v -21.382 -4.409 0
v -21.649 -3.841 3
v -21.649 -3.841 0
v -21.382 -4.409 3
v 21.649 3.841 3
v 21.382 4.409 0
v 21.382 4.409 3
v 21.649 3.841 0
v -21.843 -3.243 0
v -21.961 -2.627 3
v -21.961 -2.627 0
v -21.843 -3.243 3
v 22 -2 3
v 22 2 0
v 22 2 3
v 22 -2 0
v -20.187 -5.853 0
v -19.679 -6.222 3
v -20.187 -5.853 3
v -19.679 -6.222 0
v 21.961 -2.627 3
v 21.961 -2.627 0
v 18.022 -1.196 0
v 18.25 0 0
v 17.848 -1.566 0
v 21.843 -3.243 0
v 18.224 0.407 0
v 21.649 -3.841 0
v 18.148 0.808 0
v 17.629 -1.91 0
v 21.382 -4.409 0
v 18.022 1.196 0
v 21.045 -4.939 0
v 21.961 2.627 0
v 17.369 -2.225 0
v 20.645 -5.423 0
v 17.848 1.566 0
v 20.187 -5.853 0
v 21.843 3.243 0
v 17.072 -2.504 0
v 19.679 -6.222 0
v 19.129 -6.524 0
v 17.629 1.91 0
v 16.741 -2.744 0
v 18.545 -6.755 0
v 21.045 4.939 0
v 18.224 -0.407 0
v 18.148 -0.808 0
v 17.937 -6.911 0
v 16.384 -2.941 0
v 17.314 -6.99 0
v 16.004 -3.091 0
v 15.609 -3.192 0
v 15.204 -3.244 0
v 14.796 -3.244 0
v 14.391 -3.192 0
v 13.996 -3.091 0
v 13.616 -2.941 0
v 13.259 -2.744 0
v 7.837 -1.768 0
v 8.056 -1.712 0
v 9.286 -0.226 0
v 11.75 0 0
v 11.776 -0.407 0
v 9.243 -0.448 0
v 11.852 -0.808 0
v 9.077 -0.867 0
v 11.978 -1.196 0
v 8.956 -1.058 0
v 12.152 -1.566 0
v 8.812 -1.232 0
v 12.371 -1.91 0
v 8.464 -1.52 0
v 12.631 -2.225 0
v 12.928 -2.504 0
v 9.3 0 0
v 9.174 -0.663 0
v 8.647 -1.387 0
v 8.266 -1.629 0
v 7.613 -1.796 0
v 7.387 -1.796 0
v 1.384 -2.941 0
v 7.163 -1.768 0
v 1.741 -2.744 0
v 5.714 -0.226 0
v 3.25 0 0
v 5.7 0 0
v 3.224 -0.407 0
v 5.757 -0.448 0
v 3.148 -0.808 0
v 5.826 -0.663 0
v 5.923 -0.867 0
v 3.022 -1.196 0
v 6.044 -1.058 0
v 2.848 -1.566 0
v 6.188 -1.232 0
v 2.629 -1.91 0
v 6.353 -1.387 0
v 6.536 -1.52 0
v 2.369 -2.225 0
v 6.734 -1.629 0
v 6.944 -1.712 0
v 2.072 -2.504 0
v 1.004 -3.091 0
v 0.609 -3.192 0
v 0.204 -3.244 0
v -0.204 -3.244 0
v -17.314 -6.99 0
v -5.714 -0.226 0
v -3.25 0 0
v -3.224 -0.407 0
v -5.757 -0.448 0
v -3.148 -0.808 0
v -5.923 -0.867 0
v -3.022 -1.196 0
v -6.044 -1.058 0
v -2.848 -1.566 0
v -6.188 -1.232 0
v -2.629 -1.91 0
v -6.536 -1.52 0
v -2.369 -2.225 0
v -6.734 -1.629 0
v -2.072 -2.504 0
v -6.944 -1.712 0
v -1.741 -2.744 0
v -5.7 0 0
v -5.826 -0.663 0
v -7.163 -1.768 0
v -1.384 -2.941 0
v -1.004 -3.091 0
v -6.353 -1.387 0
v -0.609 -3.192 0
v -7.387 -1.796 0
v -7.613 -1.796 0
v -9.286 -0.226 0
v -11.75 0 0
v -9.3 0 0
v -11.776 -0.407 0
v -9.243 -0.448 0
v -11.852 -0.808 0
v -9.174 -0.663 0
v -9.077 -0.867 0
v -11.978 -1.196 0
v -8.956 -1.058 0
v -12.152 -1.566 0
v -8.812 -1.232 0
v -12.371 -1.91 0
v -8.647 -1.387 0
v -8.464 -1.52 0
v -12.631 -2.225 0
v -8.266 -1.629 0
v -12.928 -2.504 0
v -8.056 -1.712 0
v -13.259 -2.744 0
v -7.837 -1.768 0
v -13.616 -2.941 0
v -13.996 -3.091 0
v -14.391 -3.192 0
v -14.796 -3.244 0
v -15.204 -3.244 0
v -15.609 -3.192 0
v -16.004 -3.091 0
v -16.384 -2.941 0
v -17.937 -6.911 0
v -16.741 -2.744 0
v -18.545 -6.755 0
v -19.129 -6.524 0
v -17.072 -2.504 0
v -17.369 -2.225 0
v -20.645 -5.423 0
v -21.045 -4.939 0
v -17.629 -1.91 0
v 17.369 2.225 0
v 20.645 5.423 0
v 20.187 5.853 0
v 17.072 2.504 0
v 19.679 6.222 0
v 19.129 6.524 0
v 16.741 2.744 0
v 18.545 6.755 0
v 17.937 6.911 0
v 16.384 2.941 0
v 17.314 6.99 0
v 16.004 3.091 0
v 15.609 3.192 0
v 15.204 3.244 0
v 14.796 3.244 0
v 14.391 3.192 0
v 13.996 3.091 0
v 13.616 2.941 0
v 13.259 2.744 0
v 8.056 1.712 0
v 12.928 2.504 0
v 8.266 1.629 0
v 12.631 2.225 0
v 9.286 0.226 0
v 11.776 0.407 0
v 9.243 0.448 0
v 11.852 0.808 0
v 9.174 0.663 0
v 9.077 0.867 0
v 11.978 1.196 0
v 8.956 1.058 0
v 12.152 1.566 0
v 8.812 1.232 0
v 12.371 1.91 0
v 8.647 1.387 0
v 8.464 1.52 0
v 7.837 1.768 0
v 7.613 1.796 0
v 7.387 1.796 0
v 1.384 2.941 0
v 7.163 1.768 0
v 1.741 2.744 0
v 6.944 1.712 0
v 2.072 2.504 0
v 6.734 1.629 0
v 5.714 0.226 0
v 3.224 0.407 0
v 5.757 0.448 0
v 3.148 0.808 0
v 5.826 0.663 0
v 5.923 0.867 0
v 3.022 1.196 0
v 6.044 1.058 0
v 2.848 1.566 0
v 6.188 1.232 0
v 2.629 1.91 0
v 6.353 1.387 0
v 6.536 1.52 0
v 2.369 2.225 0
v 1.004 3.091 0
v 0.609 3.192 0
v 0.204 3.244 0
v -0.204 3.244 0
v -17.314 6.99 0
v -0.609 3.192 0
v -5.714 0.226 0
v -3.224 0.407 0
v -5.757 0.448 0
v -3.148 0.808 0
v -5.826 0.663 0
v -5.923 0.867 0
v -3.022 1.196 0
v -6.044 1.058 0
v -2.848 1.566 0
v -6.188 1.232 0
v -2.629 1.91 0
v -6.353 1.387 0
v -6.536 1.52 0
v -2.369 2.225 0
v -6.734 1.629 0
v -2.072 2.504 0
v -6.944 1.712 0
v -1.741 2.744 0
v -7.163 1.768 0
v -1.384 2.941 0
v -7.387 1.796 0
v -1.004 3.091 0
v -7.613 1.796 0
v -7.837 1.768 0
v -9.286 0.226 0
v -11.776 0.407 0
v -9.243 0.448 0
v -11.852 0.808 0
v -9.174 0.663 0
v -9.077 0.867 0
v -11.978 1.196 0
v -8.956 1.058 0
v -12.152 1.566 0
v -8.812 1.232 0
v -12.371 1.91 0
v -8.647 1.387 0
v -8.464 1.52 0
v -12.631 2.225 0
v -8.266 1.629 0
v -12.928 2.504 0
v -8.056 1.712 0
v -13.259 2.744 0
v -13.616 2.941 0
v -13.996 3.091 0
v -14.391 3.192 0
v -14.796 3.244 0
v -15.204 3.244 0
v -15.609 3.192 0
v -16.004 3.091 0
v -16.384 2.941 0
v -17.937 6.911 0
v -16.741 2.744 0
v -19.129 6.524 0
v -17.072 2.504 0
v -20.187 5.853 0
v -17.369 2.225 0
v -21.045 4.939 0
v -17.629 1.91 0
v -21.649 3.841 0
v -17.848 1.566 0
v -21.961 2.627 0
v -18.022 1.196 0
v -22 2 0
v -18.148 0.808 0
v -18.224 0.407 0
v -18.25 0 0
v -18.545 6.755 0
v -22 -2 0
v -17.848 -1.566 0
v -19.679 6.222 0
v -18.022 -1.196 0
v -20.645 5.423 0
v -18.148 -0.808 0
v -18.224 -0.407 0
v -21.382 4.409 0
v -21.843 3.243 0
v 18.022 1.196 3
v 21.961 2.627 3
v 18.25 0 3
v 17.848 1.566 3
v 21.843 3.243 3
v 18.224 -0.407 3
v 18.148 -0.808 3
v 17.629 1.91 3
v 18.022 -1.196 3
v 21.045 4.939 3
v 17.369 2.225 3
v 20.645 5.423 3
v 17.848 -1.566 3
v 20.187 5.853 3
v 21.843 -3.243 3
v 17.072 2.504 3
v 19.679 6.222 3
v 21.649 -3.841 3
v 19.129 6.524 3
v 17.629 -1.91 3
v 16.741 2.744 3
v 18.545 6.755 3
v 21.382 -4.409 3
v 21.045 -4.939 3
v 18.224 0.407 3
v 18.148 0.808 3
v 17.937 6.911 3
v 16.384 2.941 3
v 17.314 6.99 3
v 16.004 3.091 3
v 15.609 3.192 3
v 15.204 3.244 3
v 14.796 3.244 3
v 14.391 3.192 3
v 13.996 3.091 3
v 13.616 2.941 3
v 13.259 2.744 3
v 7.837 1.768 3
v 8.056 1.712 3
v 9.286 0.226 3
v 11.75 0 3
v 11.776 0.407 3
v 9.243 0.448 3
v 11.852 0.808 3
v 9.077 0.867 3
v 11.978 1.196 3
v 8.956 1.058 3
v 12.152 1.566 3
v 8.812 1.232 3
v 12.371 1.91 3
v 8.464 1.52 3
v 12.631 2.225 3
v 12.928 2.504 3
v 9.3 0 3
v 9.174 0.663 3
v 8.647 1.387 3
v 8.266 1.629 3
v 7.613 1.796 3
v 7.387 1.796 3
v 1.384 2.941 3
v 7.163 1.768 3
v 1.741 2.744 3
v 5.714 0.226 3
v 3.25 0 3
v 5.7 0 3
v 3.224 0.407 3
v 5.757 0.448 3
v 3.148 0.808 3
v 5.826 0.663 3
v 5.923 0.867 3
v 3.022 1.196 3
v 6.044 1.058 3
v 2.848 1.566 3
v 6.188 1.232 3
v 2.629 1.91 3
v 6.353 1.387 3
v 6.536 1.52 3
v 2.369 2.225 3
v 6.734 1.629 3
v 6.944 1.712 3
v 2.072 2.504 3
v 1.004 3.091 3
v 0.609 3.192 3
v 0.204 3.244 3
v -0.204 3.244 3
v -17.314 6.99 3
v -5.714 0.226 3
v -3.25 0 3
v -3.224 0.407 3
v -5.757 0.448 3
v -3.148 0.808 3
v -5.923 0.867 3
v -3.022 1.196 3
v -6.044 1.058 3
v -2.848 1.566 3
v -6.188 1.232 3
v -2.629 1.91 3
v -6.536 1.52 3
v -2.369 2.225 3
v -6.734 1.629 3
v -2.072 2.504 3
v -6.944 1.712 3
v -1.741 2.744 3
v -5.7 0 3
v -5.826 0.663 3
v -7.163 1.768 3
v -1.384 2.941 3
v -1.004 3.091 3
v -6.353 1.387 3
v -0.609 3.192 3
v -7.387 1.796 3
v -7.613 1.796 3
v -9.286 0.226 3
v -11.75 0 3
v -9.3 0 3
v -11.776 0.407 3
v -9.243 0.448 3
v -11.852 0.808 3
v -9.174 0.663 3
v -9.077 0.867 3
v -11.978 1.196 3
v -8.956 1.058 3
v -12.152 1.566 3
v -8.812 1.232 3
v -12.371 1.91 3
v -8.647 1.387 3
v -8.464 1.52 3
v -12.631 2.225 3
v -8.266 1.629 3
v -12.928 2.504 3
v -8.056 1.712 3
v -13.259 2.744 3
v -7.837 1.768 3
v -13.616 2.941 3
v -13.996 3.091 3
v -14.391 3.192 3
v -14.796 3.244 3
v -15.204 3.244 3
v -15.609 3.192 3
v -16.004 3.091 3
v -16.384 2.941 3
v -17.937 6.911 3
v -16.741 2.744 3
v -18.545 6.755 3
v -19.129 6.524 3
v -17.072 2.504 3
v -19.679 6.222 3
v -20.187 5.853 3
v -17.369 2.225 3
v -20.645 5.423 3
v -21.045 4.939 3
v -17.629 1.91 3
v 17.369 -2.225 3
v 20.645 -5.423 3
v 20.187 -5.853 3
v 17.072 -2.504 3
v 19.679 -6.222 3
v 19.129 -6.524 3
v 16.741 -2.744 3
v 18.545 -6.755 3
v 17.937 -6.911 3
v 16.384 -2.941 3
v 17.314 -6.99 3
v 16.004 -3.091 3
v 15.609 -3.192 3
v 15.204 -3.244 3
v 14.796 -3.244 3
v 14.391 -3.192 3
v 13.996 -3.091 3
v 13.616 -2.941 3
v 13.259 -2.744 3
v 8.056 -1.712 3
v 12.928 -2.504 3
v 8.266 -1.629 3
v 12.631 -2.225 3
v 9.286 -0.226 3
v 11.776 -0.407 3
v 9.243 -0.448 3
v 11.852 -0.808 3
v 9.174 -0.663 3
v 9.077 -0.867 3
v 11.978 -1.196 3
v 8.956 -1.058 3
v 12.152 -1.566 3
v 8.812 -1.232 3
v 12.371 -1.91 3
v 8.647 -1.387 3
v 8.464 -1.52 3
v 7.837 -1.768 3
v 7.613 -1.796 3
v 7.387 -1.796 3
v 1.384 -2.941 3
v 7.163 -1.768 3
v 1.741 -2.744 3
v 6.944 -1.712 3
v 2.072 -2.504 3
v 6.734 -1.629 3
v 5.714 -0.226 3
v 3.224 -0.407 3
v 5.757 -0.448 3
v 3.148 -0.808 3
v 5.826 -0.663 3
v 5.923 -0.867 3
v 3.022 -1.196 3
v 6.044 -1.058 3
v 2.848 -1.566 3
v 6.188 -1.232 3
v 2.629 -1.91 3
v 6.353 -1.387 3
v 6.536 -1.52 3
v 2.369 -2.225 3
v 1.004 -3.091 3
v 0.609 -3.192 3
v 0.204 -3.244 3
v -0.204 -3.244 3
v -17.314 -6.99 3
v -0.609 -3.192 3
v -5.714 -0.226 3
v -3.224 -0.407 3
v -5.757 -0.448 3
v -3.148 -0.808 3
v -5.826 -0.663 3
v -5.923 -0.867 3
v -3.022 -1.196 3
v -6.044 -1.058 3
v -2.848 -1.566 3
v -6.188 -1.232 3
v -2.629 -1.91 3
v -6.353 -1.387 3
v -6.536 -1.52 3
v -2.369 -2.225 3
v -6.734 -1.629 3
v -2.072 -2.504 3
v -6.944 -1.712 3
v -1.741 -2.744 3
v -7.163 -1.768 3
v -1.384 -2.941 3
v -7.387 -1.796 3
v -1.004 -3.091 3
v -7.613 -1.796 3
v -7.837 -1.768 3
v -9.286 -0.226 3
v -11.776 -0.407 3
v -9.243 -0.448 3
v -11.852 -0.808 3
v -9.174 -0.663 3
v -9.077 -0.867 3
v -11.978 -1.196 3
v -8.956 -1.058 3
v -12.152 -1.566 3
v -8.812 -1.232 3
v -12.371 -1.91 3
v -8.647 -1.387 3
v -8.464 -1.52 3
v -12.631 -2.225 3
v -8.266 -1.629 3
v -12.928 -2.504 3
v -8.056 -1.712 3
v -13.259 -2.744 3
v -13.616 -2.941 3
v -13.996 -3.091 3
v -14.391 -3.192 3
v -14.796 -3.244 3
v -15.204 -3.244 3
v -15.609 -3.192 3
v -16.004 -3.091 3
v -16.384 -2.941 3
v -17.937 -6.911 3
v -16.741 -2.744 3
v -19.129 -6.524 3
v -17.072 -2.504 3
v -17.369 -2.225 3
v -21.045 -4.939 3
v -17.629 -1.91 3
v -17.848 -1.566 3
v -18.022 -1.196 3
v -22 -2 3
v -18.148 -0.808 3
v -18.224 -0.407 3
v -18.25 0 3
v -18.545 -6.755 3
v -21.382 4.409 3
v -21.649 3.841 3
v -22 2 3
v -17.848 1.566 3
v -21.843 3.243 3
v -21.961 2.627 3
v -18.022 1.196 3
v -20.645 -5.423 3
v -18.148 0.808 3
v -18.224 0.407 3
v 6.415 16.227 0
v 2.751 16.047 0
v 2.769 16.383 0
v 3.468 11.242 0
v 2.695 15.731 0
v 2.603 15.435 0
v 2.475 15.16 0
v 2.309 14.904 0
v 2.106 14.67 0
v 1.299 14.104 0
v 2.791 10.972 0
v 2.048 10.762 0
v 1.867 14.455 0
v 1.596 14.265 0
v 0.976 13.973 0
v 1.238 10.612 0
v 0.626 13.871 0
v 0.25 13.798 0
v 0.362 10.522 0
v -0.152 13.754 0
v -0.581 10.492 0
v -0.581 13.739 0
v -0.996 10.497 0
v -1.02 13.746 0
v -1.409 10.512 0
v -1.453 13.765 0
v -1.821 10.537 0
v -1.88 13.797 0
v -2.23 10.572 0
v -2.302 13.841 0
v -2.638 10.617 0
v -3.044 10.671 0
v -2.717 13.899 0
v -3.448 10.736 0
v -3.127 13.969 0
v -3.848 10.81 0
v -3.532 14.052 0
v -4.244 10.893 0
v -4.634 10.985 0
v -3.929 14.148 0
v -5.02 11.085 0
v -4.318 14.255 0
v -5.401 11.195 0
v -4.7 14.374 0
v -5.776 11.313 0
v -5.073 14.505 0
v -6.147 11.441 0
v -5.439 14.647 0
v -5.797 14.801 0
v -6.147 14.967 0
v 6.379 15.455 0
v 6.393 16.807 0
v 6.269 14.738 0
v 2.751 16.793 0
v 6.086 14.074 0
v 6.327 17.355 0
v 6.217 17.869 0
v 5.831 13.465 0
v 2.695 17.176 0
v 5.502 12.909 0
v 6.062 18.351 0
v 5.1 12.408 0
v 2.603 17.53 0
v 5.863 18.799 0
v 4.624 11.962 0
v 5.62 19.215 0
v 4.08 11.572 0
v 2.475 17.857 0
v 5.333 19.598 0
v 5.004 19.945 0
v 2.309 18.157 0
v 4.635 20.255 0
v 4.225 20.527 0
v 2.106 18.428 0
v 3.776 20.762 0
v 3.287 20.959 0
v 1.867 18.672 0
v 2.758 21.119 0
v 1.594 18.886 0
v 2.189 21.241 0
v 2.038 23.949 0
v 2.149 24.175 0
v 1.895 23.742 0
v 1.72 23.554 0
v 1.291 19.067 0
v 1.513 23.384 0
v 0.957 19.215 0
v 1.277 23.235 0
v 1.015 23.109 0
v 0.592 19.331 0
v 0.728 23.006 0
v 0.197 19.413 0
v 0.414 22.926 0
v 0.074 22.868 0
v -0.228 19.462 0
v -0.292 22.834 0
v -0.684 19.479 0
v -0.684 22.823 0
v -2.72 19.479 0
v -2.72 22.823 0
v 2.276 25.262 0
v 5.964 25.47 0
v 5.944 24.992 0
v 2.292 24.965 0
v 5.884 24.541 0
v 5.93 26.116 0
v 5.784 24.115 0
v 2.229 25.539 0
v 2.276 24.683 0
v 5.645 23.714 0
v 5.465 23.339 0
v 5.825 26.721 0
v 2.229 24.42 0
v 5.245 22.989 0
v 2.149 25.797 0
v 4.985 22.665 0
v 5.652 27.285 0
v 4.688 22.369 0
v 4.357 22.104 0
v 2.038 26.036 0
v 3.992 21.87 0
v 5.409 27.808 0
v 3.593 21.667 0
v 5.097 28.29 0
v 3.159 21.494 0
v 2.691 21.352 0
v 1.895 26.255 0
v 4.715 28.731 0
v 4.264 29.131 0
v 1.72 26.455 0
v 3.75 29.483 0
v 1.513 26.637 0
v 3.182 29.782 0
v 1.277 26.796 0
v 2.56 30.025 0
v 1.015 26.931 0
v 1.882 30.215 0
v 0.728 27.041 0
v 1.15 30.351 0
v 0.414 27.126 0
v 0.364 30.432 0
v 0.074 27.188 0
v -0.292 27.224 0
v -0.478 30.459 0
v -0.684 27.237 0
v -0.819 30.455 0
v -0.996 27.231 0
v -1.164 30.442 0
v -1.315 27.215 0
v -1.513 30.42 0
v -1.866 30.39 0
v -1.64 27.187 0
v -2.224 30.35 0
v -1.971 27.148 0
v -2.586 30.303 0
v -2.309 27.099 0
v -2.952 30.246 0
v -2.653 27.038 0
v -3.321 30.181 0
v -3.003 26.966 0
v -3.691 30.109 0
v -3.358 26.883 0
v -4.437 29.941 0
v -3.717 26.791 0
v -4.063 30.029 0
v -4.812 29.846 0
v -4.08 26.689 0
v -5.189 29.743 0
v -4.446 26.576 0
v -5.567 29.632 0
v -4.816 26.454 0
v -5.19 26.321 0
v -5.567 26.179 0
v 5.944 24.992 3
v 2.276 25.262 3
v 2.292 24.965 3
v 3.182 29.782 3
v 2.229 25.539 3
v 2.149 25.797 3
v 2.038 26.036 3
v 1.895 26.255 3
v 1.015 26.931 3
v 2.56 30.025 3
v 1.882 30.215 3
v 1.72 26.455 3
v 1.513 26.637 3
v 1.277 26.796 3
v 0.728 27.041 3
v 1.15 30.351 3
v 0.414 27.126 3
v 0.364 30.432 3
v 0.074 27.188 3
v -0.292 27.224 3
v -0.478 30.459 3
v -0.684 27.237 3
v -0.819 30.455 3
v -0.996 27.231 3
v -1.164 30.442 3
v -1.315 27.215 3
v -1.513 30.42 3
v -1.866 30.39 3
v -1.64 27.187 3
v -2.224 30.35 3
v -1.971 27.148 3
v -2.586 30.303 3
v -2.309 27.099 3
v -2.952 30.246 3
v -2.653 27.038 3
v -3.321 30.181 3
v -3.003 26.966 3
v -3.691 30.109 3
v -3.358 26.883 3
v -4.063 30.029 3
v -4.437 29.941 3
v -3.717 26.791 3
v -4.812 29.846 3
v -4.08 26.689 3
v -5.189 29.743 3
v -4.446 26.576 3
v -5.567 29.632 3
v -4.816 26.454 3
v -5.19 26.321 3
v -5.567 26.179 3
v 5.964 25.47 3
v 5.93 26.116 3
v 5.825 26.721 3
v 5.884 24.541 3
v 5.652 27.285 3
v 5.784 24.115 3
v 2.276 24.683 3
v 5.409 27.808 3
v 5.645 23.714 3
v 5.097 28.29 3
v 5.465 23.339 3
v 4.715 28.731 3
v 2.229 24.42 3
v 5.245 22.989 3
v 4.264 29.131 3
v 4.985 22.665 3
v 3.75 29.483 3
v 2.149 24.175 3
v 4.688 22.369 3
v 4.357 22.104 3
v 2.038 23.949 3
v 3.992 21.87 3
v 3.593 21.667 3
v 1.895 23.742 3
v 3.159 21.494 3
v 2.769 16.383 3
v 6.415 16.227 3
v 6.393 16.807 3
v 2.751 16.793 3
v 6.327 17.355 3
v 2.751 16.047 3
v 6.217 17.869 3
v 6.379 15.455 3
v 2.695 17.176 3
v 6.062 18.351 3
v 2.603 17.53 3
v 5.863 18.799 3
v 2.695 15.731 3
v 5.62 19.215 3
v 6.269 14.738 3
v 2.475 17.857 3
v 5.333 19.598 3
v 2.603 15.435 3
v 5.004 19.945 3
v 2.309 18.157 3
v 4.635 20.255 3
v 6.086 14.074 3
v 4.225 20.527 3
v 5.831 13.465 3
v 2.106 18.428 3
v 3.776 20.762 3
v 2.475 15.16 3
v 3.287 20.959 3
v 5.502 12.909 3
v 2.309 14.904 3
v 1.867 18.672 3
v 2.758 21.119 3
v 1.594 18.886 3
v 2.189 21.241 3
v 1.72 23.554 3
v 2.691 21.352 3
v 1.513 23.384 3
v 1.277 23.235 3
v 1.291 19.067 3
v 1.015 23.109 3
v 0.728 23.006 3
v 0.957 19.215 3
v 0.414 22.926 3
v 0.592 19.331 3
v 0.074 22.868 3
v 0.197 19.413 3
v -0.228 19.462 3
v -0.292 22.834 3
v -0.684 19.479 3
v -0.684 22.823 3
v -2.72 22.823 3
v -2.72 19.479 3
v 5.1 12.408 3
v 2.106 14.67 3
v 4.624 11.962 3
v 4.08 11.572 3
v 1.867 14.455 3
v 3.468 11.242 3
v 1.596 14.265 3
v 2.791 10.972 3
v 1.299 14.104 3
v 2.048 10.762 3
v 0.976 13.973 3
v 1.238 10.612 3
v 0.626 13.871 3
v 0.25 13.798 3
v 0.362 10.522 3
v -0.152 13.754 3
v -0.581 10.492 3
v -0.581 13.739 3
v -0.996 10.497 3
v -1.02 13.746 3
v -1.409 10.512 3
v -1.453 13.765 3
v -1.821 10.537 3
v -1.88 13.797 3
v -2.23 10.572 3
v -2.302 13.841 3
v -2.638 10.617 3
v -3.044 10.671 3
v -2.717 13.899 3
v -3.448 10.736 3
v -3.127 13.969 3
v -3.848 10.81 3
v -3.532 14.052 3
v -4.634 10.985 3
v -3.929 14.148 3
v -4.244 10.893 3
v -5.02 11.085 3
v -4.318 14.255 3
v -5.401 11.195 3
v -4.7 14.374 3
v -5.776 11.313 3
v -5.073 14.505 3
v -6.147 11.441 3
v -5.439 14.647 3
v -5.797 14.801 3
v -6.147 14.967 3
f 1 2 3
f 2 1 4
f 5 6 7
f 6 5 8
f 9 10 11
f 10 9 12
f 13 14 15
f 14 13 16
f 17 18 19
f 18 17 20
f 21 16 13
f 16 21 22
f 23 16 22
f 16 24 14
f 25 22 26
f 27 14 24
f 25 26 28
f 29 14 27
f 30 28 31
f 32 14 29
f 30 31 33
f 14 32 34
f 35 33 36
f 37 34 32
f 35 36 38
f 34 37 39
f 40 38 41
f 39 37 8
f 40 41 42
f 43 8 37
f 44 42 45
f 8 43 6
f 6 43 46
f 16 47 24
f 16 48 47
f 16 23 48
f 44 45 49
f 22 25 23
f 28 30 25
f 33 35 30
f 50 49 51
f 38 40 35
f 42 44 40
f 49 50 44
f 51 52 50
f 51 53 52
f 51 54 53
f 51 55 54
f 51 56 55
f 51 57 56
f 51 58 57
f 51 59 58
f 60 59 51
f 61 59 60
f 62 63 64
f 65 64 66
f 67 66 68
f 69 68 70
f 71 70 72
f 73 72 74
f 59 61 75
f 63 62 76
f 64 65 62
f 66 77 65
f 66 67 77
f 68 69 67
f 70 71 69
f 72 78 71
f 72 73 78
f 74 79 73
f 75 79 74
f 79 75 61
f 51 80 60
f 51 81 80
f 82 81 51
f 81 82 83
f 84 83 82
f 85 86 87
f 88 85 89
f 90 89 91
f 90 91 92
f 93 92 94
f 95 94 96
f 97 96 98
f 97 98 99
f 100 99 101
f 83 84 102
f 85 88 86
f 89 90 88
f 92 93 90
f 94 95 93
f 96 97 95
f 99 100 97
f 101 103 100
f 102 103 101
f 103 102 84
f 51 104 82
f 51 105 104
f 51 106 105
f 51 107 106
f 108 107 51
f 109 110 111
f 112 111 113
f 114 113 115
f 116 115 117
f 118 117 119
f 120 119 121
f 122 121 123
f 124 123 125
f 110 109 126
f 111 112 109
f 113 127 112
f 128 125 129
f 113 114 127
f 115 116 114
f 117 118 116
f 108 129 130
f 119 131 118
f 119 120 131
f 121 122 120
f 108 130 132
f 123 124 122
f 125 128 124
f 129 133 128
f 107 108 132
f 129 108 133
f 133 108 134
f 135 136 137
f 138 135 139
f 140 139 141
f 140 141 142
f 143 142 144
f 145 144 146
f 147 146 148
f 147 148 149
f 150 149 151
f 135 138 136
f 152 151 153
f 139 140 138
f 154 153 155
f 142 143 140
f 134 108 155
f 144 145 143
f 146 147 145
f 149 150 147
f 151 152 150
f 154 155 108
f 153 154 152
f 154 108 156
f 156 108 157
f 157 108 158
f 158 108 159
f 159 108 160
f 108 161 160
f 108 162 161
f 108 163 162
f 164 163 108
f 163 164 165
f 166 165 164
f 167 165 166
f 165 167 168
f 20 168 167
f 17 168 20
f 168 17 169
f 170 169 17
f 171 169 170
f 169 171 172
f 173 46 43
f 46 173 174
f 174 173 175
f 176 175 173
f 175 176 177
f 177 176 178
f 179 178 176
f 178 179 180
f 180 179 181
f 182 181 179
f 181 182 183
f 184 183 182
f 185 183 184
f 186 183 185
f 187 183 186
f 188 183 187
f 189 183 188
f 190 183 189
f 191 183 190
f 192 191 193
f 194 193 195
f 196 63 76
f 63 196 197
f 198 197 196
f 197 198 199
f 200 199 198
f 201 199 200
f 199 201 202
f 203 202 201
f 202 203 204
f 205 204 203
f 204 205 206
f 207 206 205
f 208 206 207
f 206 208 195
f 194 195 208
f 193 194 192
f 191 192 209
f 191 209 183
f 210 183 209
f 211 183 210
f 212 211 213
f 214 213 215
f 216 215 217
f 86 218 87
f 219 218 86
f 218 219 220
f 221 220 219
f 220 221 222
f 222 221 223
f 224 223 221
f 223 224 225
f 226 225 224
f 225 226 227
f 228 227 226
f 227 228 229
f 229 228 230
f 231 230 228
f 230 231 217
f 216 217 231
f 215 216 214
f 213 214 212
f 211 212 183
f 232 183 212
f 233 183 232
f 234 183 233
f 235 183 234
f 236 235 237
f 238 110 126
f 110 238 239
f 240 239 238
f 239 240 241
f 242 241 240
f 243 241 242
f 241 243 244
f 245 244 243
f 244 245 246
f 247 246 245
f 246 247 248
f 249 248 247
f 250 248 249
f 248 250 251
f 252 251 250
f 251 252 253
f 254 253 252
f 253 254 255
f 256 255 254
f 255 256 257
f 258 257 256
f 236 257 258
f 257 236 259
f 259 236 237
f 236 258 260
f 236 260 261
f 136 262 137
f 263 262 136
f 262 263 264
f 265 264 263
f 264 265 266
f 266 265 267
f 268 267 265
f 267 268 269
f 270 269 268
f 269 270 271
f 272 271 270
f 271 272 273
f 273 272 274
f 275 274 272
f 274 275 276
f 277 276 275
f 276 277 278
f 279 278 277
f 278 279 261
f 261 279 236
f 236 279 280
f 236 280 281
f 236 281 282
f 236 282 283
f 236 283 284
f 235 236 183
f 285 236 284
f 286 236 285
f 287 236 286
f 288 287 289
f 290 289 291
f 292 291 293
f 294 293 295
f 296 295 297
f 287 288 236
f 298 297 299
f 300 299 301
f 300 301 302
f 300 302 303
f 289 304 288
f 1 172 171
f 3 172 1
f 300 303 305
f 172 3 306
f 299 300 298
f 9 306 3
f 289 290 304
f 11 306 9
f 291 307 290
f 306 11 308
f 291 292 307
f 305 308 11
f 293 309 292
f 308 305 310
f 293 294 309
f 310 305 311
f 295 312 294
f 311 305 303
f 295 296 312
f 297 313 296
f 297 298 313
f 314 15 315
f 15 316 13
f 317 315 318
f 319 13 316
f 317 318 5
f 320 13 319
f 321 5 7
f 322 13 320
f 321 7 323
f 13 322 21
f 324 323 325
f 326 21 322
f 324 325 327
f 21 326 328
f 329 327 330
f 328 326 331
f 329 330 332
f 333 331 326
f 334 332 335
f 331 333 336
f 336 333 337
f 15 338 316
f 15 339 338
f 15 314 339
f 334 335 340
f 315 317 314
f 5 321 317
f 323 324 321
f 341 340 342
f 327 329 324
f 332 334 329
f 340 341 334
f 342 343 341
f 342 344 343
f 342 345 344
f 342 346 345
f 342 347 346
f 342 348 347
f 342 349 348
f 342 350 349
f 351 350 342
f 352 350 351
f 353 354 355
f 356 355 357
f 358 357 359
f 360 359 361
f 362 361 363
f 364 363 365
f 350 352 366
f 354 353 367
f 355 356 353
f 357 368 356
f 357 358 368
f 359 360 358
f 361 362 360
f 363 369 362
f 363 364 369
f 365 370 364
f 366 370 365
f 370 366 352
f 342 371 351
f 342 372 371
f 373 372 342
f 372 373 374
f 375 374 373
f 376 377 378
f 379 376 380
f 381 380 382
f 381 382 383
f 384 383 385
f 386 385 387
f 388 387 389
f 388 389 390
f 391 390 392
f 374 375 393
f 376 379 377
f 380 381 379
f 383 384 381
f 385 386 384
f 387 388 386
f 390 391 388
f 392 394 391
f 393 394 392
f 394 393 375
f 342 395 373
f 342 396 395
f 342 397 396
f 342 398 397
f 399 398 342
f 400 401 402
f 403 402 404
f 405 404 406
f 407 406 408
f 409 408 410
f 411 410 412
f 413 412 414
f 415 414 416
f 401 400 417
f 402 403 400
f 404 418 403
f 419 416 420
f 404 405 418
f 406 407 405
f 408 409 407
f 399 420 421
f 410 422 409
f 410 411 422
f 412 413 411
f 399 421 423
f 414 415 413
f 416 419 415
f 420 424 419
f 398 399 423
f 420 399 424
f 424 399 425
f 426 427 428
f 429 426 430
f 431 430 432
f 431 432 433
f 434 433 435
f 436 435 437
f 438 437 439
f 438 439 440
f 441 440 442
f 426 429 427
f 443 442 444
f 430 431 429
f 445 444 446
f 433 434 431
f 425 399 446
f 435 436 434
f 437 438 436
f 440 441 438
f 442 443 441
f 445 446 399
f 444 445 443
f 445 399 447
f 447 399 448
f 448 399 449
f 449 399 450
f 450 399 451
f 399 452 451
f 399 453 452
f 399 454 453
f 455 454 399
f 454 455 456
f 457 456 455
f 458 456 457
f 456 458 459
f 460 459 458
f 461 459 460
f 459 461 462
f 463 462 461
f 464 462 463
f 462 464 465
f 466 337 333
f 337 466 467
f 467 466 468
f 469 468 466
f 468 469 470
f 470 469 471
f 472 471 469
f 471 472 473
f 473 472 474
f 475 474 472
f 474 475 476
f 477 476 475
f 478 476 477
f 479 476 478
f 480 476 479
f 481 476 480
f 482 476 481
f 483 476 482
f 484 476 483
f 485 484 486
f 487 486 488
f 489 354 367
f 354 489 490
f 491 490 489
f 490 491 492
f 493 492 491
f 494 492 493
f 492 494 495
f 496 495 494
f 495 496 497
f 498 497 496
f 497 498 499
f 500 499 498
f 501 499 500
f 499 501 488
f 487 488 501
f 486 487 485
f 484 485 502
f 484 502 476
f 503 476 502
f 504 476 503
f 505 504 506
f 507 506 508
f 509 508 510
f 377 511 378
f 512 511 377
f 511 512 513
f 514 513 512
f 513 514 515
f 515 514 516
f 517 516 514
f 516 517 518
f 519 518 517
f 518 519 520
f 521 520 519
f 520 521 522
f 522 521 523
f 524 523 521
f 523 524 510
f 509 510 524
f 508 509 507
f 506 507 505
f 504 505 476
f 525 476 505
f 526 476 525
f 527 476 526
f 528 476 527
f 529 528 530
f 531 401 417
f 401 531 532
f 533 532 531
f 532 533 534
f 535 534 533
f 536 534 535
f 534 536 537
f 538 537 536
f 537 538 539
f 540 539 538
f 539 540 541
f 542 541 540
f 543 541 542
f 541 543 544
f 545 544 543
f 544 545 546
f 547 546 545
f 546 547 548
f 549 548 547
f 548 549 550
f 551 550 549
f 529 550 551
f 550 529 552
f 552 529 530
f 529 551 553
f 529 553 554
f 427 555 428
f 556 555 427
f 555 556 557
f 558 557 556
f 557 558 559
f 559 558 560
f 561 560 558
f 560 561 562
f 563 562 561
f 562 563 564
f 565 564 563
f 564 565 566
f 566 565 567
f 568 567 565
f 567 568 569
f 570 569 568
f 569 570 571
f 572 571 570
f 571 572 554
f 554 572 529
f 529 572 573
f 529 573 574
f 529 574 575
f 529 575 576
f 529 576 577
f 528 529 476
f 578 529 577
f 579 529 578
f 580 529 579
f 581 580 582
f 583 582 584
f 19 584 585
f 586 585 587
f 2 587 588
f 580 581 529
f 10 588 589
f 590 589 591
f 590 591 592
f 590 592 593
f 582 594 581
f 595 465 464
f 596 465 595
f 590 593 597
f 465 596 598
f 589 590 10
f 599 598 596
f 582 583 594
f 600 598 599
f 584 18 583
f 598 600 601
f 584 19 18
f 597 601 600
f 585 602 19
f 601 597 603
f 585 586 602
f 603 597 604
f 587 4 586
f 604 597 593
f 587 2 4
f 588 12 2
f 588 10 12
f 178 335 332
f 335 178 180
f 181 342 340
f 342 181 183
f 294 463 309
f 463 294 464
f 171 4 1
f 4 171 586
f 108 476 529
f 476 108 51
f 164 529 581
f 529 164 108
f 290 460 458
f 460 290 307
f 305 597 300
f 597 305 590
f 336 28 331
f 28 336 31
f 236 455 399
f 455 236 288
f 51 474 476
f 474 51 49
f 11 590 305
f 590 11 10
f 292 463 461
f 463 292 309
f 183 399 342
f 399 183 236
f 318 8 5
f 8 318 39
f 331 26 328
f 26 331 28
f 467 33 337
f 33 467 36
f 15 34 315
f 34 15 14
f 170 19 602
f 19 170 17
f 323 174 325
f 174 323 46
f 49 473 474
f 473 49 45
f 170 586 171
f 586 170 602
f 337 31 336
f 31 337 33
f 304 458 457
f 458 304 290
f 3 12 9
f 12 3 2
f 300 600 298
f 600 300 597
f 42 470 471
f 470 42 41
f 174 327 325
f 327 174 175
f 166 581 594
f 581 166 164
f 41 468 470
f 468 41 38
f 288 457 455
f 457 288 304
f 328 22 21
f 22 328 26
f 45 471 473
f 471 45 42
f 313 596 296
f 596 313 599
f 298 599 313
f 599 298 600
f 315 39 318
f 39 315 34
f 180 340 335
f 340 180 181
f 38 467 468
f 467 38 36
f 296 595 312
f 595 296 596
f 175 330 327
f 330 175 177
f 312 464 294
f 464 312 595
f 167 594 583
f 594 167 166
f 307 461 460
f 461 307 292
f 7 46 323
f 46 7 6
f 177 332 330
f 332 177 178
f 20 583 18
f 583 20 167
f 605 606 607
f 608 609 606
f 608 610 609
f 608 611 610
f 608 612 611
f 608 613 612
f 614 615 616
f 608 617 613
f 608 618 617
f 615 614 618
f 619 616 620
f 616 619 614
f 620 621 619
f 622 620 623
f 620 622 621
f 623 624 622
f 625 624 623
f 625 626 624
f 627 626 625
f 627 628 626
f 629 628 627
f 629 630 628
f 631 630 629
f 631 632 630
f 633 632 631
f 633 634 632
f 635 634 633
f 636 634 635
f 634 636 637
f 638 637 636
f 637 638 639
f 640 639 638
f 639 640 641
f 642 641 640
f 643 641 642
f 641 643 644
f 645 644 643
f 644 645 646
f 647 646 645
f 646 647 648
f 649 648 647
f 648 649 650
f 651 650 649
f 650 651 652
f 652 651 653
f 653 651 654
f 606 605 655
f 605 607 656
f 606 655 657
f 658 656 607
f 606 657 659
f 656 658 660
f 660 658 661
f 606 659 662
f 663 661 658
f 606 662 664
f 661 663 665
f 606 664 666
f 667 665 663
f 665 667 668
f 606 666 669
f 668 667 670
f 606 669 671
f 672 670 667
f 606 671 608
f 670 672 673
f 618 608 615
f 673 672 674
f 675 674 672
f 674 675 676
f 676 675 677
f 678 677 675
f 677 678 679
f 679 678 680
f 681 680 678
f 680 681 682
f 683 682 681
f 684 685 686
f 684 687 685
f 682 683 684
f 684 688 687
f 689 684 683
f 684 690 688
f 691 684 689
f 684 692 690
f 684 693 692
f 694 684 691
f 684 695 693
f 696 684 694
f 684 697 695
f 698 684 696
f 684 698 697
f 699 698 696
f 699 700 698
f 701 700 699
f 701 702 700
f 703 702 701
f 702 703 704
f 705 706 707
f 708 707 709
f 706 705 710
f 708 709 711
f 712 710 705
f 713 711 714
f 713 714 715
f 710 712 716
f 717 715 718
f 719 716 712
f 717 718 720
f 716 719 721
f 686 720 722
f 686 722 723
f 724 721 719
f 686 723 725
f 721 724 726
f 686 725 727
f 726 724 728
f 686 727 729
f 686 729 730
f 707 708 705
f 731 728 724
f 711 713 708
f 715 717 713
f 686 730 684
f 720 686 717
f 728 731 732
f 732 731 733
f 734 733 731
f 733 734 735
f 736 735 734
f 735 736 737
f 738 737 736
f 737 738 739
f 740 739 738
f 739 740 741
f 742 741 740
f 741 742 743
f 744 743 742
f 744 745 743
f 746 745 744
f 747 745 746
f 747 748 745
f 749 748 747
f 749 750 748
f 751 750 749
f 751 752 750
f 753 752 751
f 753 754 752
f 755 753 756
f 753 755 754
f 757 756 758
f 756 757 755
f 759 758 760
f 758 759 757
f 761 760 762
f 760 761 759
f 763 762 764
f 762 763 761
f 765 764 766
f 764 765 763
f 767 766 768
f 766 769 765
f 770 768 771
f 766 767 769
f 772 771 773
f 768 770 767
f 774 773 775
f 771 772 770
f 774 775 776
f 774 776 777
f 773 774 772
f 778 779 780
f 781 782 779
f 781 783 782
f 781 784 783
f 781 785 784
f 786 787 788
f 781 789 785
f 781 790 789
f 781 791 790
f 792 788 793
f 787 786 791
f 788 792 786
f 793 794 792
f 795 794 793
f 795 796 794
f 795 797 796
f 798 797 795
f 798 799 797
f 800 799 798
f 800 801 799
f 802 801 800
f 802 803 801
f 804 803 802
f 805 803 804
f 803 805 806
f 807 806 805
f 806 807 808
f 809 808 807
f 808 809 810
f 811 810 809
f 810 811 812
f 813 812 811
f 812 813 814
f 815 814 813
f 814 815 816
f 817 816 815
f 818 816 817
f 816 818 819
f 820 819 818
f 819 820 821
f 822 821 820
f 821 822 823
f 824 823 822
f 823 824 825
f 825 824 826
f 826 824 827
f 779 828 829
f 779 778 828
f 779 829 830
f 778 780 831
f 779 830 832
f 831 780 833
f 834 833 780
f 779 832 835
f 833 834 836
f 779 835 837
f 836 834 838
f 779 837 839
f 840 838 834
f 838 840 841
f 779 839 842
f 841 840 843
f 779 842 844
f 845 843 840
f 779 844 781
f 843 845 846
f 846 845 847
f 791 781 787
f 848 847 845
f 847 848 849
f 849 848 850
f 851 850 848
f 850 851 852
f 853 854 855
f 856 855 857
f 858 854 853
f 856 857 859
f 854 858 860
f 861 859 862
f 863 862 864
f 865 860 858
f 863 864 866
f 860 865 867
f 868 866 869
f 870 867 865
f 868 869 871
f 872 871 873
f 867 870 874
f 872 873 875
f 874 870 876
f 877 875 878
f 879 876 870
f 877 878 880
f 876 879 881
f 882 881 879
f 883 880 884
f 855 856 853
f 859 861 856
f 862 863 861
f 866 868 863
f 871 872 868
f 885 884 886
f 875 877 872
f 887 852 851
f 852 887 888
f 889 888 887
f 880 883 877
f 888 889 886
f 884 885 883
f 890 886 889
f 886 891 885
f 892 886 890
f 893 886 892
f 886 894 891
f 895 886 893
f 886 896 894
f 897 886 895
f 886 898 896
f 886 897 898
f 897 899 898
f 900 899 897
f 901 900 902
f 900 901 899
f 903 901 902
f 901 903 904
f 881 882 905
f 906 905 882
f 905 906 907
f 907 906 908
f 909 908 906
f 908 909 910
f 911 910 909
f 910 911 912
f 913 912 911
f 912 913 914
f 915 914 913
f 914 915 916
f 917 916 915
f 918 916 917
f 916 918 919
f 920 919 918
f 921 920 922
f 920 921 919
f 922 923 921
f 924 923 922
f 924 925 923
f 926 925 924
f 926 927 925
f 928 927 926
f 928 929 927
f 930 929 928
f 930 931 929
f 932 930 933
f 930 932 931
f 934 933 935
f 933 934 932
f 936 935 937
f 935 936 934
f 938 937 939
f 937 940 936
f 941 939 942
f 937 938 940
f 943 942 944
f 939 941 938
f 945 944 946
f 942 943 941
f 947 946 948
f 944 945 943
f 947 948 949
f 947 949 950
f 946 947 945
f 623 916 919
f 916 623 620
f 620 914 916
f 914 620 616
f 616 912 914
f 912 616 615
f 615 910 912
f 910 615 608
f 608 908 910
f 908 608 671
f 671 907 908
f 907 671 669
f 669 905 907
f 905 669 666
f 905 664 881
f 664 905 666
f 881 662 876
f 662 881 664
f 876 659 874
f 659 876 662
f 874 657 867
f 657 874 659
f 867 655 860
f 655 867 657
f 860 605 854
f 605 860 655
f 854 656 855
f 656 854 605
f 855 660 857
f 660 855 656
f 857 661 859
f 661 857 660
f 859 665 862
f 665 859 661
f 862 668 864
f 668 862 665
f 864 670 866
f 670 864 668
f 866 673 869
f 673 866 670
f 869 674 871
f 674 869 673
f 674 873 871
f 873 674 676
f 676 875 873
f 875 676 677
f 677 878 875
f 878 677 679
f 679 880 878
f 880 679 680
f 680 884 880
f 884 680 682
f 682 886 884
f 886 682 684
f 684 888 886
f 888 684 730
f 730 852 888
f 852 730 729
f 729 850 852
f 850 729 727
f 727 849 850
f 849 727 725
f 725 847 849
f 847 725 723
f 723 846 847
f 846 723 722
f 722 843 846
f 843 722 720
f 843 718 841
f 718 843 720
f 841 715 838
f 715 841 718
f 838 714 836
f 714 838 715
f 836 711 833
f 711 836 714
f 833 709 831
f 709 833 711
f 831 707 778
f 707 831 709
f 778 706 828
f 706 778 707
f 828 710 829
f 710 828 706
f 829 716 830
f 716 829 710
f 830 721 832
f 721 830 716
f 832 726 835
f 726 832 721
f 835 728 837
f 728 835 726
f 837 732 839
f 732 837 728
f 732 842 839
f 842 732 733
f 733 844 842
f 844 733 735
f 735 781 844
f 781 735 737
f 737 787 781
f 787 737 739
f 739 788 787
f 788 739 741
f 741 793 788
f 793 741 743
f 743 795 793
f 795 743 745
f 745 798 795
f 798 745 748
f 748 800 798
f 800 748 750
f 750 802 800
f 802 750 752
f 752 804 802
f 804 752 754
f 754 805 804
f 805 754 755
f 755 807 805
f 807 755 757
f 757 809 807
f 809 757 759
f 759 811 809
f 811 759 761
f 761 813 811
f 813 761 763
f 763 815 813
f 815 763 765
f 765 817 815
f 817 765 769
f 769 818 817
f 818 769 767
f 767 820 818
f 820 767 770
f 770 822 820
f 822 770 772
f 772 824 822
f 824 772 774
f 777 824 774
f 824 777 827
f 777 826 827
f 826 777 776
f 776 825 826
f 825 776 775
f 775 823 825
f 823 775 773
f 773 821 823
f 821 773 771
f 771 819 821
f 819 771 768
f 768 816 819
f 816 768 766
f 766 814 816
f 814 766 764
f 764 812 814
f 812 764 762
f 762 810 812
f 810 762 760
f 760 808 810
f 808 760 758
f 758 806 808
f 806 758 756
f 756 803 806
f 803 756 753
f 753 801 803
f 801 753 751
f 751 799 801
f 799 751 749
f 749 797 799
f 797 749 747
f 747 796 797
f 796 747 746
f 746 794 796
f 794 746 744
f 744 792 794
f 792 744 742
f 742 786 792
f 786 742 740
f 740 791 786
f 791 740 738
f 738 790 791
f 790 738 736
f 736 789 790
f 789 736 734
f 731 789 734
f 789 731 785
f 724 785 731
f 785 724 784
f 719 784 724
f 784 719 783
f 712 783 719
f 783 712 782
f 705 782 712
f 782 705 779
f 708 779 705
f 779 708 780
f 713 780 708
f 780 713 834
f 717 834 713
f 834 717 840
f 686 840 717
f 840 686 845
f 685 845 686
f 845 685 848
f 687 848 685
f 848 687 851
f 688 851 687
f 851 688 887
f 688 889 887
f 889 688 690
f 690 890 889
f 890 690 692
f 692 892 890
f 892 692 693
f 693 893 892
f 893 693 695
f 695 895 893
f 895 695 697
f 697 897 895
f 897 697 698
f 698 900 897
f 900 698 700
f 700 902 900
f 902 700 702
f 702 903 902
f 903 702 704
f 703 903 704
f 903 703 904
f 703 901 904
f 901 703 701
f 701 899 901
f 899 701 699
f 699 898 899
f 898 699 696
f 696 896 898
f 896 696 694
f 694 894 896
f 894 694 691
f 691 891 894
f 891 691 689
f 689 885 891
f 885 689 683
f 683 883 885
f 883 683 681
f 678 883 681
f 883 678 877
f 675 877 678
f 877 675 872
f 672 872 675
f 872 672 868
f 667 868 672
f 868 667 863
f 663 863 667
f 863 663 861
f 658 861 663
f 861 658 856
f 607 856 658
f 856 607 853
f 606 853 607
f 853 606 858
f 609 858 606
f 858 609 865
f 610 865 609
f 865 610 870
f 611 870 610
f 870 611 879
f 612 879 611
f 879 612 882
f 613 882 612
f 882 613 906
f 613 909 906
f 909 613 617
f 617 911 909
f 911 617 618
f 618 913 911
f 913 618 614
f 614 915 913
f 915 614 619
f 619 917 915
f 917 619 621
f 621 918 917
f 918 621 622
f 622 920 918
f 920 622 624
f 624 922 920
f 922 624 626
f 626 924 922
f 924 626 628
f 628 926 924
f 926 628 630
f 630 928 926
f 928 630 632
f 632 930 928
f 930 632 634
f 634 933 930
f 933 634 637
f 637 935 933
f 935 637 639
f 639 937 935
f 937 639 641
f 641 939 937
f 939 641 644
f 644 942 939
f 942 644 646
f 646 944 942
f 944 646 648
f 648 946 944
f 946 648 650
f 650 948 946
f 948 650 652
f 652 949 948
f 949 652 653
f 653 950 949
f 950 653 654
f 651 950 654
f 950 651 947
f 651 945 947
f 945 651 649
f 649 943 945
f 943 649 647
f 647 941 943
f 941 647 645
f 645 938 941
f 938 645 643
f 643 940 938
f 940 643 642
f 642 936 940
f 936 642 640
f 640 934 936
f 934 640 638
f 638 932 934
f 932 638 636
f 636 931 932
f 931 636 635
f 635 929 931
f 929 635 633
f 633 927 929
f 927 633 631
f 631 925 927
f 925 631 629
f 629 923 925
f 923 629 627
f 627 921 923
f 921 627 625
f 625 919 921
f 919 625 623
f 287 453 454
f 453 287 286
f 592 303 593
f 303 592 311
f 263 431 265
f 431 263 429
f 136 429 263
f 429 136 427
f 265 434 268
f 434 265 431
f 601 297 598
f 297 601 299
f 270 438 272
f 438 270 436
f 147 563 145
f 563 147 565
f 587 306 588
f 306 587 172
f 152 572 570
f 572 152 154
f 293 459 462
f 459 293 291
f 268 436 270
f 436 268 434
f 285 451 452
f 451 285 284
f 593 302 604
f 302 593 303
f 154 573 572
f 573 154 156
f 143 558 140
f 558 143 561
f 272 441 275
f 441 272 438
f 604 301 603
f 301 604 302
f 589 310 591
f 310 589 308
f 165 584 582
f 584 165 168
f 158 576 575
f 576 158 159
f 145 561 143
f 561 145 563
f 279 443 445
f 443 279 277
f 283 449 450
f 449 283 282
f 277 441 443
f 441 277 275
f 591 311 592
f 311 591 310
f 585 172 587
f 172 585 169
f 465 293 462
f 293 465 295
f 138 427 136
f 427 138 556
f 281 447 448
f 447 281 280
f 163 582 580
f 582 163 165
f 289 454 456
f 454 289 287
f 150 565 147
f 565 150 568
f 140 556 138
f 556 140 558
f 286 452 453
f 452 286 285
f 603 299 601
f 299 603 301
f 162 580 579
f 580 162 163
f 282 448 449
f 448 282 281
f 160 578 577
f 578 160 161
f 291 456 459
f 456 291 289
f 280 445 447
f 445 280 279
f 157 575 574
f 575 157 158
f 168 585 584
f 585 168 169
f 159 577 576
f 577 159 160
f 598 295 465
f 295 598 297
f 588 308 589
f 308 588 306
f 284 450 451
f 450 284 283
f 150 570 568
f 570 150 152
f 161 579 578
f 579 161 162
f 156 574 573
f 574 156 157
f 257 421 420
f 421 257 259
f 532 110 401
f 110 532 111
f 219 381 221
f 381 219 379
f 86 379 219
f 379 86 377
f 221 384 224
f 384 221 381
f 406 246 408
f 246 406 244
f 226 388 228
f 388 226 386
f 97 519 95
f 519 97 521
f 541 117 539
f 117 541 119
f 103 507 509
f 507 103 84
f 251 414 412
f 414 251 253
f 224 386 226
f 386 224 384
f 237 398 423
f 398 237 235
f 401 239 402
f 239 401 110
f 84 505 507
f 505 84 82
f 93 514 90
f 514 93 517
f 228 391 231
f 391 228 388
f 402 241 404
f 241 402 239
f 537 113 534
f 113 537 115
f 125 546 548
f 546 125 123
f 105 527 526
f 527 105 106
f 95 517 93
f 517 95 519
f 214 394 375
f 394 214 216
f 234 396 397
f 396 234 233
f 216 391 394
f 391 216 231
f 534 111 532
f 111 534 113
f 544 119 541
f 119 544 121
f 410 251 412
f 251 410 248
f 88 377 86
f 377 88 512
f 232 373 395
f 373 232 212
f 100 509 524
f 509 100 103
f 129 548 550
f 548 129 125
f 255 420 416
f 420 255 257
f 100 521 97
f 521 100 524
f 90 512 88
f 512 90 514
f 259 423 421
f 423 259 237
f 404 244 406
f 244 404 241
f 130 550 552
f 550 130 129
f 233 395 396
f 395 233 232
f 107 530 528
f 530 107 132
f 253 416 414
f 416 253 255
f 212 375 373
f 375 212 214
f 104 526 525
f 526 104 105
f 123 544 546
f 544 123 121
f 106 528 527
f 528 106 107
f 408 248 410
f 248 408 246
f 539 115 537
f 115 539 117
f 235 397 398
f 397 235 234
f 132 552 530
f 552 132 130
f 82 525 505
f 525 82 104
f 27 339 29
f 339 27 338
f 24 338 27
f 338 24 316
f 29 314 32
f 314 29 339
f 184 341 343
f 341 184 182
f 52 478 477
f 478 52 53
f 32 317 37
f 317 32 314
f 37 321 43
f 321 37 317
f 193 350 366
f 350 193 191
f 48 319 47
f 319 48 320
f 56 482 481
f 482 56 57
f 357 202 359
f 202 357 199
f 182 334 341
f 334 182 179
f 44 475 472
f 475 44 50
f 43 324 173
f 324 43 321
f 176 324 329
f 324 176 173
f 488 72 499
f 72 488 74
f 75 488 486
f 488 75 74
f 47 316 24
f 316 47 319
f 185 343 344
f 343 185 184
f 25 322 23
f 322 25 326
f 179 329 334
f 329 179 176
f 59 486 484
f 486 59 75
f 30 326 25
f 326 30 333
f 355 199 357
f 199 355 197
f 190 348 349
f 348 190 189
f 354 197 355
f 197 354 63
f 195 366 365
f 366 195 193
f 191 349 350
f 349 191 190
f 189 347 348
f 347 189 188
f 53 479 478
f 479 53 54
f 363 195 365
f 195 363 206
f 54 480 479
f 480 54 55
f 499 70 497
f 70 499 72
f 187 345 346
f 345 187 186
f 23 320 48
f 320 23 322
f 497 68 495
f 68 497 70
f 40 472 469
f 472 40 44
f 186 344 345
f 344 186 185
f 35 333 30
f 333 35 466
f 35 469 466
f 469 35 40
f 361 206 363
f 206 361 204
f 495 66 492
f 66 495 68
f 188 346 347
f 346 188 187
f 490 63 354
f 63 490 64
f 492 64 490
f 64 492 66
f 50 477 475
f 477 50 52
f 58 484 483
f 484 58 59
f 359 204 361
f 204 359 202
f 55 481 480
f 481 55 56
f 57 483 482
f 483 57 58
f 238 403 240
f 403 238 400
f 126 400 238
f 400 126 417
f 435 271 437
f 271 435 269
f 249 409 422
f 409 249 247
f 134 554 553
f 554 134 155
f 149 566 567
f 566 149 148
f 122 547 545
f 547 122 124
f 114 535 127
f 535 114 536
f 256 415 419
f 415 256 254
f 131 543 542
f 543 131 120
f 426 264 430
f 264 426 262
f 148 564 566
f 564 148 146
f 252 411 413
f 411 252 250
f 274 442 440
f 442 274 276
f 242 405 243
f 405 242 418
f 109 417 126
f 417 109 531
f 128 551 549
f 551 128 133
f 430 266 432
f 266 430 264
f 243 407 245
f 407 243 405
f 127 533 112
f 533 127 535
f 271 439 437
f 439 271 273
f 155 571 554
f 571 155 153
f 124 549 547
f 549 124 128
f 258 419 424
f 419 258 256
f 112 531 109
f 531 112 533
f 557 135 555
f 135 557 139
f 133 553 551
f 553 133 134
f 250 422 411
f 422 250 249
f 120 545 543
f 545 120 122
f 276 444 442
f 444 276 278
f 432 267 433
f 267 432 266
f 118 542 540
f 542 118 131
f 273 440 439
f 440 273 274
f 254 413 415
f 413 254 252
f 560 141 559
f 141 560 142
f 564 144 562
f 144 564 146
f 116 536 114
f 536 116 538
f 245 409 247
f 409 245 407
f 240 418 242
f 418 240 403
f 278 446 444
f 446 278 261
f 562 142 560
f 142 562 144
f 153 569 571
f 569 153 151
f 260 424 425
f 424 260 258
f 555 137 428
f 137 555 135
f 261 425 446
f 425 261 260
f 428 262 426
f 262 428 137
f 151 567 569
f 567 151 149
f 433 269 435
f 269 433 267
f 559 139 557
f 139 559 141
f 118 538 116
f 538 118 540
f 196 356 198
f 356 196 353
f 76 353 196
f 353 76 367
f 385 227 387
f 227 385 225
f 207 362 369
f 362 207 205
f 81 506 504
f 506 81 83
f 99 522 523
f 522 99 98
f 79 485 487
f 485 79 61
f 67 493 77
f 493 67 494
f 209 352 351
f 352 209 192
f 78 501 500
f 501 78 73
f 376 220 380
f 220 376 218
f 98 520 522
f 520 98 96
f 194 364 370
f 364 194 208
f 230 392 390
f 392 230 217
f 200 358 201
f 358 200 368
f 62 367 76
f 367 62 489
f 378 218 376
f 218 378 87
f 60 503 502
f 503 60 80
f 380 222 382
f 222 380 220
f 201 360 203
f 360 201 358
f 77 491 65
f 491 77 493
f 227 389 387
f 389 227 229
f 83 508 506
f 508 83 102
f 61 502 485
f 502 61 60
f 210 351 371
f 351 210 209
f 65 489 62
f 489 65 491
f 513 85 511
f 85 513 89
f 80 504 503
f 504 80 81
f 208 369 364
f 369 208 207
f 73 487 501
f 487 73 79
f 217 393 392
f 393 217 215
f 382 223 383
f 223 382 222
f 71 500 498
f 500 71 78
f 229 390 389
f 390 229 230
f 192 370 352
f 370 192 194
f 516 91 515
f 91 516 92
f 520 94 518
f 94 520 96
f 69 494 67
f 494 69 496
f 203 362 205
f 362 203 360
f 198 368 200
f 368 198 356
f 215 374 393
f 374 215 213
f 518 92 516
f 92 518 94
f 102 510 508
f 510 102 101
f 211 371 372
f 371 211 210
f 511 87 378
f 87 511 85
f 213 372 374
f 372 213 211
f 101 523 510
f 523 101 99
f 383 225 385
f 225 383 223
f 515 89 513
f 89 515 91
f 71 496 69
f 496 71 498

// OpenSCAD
$fn = 50;


difference() {
	union() {
		hull() {
			translate(v = [-17.0000000000, 2.0000000000, 0]) {
				cylinder(h = 3, r = 5);
			}
			translate(v = [17.0000000000, 2.0000000000, 0]) {
				cylinder(h = 3, r = 5);
			}
			translate(v = [-17.0000000000, -2.0000000000, 0]) {
				cylinder(h = 3, r = 5);
			}
			translate(v = [17.0000000000, -2.0000000000, 0]) {
				cylinder(h = 3, r = 5);
			}
		}
		translate(v = [0, 30.0000000000, 0]) {
			linear_extrude(height = 3) {
				text(font = "DejaVu Sans Mono:style=Bold", halign = "center", size = 19.0000000000, text = "3", valign = "top");
			}
		}
	}
	union() {
		translate(v = [-15.0000000000, 0.0000000000, 0]) {
			translate(v = [0, 0, -100]) {
				cylinder(h = 200, r = 3.2500000000);
			}
		}
		translate(v = [0, 0, -100]) {
			cylinder(h = 200, r = 3.2500000000);
		}
		translate(v = [15.0000000000, 0.0000000000, 0]) {
			translate(v = [0, 0, -100]) {
				cylinder(h = 200, r = 3.2500000000);
			}
		}
		translate(v = [-15.0000000000, 0.0000000000, 0]) {
			translate(v = [0, 0, -100]) {
				cylinder(h = 200, r = 1.8000000000);
			}
		}
		translate(v = [-7.5000000000, 0.0000000000, 0]) {
			translate(v = [0, 0, -100]) {
				cylinder(h = 200, r = 1.8000000000);
			}
		}
		translate(v = [0, 0, -100]) {
			cylinder(h = 200, r = 1.8000000000);
		}
		translate(v = [7.5000000000, 0.0000000000, 0]) {
			translate(v = [0, 0, -100]) {
				cylinder(h = 200, r = 1.8000000000);
			}
		}
		translate(v = [15.0000000000, 0.0000000000, 0]) {
			translate(v = [0, 0, -100]) {
				cylinder(h = 200, r = 1.8000000000);
			}
		}
	}
}
